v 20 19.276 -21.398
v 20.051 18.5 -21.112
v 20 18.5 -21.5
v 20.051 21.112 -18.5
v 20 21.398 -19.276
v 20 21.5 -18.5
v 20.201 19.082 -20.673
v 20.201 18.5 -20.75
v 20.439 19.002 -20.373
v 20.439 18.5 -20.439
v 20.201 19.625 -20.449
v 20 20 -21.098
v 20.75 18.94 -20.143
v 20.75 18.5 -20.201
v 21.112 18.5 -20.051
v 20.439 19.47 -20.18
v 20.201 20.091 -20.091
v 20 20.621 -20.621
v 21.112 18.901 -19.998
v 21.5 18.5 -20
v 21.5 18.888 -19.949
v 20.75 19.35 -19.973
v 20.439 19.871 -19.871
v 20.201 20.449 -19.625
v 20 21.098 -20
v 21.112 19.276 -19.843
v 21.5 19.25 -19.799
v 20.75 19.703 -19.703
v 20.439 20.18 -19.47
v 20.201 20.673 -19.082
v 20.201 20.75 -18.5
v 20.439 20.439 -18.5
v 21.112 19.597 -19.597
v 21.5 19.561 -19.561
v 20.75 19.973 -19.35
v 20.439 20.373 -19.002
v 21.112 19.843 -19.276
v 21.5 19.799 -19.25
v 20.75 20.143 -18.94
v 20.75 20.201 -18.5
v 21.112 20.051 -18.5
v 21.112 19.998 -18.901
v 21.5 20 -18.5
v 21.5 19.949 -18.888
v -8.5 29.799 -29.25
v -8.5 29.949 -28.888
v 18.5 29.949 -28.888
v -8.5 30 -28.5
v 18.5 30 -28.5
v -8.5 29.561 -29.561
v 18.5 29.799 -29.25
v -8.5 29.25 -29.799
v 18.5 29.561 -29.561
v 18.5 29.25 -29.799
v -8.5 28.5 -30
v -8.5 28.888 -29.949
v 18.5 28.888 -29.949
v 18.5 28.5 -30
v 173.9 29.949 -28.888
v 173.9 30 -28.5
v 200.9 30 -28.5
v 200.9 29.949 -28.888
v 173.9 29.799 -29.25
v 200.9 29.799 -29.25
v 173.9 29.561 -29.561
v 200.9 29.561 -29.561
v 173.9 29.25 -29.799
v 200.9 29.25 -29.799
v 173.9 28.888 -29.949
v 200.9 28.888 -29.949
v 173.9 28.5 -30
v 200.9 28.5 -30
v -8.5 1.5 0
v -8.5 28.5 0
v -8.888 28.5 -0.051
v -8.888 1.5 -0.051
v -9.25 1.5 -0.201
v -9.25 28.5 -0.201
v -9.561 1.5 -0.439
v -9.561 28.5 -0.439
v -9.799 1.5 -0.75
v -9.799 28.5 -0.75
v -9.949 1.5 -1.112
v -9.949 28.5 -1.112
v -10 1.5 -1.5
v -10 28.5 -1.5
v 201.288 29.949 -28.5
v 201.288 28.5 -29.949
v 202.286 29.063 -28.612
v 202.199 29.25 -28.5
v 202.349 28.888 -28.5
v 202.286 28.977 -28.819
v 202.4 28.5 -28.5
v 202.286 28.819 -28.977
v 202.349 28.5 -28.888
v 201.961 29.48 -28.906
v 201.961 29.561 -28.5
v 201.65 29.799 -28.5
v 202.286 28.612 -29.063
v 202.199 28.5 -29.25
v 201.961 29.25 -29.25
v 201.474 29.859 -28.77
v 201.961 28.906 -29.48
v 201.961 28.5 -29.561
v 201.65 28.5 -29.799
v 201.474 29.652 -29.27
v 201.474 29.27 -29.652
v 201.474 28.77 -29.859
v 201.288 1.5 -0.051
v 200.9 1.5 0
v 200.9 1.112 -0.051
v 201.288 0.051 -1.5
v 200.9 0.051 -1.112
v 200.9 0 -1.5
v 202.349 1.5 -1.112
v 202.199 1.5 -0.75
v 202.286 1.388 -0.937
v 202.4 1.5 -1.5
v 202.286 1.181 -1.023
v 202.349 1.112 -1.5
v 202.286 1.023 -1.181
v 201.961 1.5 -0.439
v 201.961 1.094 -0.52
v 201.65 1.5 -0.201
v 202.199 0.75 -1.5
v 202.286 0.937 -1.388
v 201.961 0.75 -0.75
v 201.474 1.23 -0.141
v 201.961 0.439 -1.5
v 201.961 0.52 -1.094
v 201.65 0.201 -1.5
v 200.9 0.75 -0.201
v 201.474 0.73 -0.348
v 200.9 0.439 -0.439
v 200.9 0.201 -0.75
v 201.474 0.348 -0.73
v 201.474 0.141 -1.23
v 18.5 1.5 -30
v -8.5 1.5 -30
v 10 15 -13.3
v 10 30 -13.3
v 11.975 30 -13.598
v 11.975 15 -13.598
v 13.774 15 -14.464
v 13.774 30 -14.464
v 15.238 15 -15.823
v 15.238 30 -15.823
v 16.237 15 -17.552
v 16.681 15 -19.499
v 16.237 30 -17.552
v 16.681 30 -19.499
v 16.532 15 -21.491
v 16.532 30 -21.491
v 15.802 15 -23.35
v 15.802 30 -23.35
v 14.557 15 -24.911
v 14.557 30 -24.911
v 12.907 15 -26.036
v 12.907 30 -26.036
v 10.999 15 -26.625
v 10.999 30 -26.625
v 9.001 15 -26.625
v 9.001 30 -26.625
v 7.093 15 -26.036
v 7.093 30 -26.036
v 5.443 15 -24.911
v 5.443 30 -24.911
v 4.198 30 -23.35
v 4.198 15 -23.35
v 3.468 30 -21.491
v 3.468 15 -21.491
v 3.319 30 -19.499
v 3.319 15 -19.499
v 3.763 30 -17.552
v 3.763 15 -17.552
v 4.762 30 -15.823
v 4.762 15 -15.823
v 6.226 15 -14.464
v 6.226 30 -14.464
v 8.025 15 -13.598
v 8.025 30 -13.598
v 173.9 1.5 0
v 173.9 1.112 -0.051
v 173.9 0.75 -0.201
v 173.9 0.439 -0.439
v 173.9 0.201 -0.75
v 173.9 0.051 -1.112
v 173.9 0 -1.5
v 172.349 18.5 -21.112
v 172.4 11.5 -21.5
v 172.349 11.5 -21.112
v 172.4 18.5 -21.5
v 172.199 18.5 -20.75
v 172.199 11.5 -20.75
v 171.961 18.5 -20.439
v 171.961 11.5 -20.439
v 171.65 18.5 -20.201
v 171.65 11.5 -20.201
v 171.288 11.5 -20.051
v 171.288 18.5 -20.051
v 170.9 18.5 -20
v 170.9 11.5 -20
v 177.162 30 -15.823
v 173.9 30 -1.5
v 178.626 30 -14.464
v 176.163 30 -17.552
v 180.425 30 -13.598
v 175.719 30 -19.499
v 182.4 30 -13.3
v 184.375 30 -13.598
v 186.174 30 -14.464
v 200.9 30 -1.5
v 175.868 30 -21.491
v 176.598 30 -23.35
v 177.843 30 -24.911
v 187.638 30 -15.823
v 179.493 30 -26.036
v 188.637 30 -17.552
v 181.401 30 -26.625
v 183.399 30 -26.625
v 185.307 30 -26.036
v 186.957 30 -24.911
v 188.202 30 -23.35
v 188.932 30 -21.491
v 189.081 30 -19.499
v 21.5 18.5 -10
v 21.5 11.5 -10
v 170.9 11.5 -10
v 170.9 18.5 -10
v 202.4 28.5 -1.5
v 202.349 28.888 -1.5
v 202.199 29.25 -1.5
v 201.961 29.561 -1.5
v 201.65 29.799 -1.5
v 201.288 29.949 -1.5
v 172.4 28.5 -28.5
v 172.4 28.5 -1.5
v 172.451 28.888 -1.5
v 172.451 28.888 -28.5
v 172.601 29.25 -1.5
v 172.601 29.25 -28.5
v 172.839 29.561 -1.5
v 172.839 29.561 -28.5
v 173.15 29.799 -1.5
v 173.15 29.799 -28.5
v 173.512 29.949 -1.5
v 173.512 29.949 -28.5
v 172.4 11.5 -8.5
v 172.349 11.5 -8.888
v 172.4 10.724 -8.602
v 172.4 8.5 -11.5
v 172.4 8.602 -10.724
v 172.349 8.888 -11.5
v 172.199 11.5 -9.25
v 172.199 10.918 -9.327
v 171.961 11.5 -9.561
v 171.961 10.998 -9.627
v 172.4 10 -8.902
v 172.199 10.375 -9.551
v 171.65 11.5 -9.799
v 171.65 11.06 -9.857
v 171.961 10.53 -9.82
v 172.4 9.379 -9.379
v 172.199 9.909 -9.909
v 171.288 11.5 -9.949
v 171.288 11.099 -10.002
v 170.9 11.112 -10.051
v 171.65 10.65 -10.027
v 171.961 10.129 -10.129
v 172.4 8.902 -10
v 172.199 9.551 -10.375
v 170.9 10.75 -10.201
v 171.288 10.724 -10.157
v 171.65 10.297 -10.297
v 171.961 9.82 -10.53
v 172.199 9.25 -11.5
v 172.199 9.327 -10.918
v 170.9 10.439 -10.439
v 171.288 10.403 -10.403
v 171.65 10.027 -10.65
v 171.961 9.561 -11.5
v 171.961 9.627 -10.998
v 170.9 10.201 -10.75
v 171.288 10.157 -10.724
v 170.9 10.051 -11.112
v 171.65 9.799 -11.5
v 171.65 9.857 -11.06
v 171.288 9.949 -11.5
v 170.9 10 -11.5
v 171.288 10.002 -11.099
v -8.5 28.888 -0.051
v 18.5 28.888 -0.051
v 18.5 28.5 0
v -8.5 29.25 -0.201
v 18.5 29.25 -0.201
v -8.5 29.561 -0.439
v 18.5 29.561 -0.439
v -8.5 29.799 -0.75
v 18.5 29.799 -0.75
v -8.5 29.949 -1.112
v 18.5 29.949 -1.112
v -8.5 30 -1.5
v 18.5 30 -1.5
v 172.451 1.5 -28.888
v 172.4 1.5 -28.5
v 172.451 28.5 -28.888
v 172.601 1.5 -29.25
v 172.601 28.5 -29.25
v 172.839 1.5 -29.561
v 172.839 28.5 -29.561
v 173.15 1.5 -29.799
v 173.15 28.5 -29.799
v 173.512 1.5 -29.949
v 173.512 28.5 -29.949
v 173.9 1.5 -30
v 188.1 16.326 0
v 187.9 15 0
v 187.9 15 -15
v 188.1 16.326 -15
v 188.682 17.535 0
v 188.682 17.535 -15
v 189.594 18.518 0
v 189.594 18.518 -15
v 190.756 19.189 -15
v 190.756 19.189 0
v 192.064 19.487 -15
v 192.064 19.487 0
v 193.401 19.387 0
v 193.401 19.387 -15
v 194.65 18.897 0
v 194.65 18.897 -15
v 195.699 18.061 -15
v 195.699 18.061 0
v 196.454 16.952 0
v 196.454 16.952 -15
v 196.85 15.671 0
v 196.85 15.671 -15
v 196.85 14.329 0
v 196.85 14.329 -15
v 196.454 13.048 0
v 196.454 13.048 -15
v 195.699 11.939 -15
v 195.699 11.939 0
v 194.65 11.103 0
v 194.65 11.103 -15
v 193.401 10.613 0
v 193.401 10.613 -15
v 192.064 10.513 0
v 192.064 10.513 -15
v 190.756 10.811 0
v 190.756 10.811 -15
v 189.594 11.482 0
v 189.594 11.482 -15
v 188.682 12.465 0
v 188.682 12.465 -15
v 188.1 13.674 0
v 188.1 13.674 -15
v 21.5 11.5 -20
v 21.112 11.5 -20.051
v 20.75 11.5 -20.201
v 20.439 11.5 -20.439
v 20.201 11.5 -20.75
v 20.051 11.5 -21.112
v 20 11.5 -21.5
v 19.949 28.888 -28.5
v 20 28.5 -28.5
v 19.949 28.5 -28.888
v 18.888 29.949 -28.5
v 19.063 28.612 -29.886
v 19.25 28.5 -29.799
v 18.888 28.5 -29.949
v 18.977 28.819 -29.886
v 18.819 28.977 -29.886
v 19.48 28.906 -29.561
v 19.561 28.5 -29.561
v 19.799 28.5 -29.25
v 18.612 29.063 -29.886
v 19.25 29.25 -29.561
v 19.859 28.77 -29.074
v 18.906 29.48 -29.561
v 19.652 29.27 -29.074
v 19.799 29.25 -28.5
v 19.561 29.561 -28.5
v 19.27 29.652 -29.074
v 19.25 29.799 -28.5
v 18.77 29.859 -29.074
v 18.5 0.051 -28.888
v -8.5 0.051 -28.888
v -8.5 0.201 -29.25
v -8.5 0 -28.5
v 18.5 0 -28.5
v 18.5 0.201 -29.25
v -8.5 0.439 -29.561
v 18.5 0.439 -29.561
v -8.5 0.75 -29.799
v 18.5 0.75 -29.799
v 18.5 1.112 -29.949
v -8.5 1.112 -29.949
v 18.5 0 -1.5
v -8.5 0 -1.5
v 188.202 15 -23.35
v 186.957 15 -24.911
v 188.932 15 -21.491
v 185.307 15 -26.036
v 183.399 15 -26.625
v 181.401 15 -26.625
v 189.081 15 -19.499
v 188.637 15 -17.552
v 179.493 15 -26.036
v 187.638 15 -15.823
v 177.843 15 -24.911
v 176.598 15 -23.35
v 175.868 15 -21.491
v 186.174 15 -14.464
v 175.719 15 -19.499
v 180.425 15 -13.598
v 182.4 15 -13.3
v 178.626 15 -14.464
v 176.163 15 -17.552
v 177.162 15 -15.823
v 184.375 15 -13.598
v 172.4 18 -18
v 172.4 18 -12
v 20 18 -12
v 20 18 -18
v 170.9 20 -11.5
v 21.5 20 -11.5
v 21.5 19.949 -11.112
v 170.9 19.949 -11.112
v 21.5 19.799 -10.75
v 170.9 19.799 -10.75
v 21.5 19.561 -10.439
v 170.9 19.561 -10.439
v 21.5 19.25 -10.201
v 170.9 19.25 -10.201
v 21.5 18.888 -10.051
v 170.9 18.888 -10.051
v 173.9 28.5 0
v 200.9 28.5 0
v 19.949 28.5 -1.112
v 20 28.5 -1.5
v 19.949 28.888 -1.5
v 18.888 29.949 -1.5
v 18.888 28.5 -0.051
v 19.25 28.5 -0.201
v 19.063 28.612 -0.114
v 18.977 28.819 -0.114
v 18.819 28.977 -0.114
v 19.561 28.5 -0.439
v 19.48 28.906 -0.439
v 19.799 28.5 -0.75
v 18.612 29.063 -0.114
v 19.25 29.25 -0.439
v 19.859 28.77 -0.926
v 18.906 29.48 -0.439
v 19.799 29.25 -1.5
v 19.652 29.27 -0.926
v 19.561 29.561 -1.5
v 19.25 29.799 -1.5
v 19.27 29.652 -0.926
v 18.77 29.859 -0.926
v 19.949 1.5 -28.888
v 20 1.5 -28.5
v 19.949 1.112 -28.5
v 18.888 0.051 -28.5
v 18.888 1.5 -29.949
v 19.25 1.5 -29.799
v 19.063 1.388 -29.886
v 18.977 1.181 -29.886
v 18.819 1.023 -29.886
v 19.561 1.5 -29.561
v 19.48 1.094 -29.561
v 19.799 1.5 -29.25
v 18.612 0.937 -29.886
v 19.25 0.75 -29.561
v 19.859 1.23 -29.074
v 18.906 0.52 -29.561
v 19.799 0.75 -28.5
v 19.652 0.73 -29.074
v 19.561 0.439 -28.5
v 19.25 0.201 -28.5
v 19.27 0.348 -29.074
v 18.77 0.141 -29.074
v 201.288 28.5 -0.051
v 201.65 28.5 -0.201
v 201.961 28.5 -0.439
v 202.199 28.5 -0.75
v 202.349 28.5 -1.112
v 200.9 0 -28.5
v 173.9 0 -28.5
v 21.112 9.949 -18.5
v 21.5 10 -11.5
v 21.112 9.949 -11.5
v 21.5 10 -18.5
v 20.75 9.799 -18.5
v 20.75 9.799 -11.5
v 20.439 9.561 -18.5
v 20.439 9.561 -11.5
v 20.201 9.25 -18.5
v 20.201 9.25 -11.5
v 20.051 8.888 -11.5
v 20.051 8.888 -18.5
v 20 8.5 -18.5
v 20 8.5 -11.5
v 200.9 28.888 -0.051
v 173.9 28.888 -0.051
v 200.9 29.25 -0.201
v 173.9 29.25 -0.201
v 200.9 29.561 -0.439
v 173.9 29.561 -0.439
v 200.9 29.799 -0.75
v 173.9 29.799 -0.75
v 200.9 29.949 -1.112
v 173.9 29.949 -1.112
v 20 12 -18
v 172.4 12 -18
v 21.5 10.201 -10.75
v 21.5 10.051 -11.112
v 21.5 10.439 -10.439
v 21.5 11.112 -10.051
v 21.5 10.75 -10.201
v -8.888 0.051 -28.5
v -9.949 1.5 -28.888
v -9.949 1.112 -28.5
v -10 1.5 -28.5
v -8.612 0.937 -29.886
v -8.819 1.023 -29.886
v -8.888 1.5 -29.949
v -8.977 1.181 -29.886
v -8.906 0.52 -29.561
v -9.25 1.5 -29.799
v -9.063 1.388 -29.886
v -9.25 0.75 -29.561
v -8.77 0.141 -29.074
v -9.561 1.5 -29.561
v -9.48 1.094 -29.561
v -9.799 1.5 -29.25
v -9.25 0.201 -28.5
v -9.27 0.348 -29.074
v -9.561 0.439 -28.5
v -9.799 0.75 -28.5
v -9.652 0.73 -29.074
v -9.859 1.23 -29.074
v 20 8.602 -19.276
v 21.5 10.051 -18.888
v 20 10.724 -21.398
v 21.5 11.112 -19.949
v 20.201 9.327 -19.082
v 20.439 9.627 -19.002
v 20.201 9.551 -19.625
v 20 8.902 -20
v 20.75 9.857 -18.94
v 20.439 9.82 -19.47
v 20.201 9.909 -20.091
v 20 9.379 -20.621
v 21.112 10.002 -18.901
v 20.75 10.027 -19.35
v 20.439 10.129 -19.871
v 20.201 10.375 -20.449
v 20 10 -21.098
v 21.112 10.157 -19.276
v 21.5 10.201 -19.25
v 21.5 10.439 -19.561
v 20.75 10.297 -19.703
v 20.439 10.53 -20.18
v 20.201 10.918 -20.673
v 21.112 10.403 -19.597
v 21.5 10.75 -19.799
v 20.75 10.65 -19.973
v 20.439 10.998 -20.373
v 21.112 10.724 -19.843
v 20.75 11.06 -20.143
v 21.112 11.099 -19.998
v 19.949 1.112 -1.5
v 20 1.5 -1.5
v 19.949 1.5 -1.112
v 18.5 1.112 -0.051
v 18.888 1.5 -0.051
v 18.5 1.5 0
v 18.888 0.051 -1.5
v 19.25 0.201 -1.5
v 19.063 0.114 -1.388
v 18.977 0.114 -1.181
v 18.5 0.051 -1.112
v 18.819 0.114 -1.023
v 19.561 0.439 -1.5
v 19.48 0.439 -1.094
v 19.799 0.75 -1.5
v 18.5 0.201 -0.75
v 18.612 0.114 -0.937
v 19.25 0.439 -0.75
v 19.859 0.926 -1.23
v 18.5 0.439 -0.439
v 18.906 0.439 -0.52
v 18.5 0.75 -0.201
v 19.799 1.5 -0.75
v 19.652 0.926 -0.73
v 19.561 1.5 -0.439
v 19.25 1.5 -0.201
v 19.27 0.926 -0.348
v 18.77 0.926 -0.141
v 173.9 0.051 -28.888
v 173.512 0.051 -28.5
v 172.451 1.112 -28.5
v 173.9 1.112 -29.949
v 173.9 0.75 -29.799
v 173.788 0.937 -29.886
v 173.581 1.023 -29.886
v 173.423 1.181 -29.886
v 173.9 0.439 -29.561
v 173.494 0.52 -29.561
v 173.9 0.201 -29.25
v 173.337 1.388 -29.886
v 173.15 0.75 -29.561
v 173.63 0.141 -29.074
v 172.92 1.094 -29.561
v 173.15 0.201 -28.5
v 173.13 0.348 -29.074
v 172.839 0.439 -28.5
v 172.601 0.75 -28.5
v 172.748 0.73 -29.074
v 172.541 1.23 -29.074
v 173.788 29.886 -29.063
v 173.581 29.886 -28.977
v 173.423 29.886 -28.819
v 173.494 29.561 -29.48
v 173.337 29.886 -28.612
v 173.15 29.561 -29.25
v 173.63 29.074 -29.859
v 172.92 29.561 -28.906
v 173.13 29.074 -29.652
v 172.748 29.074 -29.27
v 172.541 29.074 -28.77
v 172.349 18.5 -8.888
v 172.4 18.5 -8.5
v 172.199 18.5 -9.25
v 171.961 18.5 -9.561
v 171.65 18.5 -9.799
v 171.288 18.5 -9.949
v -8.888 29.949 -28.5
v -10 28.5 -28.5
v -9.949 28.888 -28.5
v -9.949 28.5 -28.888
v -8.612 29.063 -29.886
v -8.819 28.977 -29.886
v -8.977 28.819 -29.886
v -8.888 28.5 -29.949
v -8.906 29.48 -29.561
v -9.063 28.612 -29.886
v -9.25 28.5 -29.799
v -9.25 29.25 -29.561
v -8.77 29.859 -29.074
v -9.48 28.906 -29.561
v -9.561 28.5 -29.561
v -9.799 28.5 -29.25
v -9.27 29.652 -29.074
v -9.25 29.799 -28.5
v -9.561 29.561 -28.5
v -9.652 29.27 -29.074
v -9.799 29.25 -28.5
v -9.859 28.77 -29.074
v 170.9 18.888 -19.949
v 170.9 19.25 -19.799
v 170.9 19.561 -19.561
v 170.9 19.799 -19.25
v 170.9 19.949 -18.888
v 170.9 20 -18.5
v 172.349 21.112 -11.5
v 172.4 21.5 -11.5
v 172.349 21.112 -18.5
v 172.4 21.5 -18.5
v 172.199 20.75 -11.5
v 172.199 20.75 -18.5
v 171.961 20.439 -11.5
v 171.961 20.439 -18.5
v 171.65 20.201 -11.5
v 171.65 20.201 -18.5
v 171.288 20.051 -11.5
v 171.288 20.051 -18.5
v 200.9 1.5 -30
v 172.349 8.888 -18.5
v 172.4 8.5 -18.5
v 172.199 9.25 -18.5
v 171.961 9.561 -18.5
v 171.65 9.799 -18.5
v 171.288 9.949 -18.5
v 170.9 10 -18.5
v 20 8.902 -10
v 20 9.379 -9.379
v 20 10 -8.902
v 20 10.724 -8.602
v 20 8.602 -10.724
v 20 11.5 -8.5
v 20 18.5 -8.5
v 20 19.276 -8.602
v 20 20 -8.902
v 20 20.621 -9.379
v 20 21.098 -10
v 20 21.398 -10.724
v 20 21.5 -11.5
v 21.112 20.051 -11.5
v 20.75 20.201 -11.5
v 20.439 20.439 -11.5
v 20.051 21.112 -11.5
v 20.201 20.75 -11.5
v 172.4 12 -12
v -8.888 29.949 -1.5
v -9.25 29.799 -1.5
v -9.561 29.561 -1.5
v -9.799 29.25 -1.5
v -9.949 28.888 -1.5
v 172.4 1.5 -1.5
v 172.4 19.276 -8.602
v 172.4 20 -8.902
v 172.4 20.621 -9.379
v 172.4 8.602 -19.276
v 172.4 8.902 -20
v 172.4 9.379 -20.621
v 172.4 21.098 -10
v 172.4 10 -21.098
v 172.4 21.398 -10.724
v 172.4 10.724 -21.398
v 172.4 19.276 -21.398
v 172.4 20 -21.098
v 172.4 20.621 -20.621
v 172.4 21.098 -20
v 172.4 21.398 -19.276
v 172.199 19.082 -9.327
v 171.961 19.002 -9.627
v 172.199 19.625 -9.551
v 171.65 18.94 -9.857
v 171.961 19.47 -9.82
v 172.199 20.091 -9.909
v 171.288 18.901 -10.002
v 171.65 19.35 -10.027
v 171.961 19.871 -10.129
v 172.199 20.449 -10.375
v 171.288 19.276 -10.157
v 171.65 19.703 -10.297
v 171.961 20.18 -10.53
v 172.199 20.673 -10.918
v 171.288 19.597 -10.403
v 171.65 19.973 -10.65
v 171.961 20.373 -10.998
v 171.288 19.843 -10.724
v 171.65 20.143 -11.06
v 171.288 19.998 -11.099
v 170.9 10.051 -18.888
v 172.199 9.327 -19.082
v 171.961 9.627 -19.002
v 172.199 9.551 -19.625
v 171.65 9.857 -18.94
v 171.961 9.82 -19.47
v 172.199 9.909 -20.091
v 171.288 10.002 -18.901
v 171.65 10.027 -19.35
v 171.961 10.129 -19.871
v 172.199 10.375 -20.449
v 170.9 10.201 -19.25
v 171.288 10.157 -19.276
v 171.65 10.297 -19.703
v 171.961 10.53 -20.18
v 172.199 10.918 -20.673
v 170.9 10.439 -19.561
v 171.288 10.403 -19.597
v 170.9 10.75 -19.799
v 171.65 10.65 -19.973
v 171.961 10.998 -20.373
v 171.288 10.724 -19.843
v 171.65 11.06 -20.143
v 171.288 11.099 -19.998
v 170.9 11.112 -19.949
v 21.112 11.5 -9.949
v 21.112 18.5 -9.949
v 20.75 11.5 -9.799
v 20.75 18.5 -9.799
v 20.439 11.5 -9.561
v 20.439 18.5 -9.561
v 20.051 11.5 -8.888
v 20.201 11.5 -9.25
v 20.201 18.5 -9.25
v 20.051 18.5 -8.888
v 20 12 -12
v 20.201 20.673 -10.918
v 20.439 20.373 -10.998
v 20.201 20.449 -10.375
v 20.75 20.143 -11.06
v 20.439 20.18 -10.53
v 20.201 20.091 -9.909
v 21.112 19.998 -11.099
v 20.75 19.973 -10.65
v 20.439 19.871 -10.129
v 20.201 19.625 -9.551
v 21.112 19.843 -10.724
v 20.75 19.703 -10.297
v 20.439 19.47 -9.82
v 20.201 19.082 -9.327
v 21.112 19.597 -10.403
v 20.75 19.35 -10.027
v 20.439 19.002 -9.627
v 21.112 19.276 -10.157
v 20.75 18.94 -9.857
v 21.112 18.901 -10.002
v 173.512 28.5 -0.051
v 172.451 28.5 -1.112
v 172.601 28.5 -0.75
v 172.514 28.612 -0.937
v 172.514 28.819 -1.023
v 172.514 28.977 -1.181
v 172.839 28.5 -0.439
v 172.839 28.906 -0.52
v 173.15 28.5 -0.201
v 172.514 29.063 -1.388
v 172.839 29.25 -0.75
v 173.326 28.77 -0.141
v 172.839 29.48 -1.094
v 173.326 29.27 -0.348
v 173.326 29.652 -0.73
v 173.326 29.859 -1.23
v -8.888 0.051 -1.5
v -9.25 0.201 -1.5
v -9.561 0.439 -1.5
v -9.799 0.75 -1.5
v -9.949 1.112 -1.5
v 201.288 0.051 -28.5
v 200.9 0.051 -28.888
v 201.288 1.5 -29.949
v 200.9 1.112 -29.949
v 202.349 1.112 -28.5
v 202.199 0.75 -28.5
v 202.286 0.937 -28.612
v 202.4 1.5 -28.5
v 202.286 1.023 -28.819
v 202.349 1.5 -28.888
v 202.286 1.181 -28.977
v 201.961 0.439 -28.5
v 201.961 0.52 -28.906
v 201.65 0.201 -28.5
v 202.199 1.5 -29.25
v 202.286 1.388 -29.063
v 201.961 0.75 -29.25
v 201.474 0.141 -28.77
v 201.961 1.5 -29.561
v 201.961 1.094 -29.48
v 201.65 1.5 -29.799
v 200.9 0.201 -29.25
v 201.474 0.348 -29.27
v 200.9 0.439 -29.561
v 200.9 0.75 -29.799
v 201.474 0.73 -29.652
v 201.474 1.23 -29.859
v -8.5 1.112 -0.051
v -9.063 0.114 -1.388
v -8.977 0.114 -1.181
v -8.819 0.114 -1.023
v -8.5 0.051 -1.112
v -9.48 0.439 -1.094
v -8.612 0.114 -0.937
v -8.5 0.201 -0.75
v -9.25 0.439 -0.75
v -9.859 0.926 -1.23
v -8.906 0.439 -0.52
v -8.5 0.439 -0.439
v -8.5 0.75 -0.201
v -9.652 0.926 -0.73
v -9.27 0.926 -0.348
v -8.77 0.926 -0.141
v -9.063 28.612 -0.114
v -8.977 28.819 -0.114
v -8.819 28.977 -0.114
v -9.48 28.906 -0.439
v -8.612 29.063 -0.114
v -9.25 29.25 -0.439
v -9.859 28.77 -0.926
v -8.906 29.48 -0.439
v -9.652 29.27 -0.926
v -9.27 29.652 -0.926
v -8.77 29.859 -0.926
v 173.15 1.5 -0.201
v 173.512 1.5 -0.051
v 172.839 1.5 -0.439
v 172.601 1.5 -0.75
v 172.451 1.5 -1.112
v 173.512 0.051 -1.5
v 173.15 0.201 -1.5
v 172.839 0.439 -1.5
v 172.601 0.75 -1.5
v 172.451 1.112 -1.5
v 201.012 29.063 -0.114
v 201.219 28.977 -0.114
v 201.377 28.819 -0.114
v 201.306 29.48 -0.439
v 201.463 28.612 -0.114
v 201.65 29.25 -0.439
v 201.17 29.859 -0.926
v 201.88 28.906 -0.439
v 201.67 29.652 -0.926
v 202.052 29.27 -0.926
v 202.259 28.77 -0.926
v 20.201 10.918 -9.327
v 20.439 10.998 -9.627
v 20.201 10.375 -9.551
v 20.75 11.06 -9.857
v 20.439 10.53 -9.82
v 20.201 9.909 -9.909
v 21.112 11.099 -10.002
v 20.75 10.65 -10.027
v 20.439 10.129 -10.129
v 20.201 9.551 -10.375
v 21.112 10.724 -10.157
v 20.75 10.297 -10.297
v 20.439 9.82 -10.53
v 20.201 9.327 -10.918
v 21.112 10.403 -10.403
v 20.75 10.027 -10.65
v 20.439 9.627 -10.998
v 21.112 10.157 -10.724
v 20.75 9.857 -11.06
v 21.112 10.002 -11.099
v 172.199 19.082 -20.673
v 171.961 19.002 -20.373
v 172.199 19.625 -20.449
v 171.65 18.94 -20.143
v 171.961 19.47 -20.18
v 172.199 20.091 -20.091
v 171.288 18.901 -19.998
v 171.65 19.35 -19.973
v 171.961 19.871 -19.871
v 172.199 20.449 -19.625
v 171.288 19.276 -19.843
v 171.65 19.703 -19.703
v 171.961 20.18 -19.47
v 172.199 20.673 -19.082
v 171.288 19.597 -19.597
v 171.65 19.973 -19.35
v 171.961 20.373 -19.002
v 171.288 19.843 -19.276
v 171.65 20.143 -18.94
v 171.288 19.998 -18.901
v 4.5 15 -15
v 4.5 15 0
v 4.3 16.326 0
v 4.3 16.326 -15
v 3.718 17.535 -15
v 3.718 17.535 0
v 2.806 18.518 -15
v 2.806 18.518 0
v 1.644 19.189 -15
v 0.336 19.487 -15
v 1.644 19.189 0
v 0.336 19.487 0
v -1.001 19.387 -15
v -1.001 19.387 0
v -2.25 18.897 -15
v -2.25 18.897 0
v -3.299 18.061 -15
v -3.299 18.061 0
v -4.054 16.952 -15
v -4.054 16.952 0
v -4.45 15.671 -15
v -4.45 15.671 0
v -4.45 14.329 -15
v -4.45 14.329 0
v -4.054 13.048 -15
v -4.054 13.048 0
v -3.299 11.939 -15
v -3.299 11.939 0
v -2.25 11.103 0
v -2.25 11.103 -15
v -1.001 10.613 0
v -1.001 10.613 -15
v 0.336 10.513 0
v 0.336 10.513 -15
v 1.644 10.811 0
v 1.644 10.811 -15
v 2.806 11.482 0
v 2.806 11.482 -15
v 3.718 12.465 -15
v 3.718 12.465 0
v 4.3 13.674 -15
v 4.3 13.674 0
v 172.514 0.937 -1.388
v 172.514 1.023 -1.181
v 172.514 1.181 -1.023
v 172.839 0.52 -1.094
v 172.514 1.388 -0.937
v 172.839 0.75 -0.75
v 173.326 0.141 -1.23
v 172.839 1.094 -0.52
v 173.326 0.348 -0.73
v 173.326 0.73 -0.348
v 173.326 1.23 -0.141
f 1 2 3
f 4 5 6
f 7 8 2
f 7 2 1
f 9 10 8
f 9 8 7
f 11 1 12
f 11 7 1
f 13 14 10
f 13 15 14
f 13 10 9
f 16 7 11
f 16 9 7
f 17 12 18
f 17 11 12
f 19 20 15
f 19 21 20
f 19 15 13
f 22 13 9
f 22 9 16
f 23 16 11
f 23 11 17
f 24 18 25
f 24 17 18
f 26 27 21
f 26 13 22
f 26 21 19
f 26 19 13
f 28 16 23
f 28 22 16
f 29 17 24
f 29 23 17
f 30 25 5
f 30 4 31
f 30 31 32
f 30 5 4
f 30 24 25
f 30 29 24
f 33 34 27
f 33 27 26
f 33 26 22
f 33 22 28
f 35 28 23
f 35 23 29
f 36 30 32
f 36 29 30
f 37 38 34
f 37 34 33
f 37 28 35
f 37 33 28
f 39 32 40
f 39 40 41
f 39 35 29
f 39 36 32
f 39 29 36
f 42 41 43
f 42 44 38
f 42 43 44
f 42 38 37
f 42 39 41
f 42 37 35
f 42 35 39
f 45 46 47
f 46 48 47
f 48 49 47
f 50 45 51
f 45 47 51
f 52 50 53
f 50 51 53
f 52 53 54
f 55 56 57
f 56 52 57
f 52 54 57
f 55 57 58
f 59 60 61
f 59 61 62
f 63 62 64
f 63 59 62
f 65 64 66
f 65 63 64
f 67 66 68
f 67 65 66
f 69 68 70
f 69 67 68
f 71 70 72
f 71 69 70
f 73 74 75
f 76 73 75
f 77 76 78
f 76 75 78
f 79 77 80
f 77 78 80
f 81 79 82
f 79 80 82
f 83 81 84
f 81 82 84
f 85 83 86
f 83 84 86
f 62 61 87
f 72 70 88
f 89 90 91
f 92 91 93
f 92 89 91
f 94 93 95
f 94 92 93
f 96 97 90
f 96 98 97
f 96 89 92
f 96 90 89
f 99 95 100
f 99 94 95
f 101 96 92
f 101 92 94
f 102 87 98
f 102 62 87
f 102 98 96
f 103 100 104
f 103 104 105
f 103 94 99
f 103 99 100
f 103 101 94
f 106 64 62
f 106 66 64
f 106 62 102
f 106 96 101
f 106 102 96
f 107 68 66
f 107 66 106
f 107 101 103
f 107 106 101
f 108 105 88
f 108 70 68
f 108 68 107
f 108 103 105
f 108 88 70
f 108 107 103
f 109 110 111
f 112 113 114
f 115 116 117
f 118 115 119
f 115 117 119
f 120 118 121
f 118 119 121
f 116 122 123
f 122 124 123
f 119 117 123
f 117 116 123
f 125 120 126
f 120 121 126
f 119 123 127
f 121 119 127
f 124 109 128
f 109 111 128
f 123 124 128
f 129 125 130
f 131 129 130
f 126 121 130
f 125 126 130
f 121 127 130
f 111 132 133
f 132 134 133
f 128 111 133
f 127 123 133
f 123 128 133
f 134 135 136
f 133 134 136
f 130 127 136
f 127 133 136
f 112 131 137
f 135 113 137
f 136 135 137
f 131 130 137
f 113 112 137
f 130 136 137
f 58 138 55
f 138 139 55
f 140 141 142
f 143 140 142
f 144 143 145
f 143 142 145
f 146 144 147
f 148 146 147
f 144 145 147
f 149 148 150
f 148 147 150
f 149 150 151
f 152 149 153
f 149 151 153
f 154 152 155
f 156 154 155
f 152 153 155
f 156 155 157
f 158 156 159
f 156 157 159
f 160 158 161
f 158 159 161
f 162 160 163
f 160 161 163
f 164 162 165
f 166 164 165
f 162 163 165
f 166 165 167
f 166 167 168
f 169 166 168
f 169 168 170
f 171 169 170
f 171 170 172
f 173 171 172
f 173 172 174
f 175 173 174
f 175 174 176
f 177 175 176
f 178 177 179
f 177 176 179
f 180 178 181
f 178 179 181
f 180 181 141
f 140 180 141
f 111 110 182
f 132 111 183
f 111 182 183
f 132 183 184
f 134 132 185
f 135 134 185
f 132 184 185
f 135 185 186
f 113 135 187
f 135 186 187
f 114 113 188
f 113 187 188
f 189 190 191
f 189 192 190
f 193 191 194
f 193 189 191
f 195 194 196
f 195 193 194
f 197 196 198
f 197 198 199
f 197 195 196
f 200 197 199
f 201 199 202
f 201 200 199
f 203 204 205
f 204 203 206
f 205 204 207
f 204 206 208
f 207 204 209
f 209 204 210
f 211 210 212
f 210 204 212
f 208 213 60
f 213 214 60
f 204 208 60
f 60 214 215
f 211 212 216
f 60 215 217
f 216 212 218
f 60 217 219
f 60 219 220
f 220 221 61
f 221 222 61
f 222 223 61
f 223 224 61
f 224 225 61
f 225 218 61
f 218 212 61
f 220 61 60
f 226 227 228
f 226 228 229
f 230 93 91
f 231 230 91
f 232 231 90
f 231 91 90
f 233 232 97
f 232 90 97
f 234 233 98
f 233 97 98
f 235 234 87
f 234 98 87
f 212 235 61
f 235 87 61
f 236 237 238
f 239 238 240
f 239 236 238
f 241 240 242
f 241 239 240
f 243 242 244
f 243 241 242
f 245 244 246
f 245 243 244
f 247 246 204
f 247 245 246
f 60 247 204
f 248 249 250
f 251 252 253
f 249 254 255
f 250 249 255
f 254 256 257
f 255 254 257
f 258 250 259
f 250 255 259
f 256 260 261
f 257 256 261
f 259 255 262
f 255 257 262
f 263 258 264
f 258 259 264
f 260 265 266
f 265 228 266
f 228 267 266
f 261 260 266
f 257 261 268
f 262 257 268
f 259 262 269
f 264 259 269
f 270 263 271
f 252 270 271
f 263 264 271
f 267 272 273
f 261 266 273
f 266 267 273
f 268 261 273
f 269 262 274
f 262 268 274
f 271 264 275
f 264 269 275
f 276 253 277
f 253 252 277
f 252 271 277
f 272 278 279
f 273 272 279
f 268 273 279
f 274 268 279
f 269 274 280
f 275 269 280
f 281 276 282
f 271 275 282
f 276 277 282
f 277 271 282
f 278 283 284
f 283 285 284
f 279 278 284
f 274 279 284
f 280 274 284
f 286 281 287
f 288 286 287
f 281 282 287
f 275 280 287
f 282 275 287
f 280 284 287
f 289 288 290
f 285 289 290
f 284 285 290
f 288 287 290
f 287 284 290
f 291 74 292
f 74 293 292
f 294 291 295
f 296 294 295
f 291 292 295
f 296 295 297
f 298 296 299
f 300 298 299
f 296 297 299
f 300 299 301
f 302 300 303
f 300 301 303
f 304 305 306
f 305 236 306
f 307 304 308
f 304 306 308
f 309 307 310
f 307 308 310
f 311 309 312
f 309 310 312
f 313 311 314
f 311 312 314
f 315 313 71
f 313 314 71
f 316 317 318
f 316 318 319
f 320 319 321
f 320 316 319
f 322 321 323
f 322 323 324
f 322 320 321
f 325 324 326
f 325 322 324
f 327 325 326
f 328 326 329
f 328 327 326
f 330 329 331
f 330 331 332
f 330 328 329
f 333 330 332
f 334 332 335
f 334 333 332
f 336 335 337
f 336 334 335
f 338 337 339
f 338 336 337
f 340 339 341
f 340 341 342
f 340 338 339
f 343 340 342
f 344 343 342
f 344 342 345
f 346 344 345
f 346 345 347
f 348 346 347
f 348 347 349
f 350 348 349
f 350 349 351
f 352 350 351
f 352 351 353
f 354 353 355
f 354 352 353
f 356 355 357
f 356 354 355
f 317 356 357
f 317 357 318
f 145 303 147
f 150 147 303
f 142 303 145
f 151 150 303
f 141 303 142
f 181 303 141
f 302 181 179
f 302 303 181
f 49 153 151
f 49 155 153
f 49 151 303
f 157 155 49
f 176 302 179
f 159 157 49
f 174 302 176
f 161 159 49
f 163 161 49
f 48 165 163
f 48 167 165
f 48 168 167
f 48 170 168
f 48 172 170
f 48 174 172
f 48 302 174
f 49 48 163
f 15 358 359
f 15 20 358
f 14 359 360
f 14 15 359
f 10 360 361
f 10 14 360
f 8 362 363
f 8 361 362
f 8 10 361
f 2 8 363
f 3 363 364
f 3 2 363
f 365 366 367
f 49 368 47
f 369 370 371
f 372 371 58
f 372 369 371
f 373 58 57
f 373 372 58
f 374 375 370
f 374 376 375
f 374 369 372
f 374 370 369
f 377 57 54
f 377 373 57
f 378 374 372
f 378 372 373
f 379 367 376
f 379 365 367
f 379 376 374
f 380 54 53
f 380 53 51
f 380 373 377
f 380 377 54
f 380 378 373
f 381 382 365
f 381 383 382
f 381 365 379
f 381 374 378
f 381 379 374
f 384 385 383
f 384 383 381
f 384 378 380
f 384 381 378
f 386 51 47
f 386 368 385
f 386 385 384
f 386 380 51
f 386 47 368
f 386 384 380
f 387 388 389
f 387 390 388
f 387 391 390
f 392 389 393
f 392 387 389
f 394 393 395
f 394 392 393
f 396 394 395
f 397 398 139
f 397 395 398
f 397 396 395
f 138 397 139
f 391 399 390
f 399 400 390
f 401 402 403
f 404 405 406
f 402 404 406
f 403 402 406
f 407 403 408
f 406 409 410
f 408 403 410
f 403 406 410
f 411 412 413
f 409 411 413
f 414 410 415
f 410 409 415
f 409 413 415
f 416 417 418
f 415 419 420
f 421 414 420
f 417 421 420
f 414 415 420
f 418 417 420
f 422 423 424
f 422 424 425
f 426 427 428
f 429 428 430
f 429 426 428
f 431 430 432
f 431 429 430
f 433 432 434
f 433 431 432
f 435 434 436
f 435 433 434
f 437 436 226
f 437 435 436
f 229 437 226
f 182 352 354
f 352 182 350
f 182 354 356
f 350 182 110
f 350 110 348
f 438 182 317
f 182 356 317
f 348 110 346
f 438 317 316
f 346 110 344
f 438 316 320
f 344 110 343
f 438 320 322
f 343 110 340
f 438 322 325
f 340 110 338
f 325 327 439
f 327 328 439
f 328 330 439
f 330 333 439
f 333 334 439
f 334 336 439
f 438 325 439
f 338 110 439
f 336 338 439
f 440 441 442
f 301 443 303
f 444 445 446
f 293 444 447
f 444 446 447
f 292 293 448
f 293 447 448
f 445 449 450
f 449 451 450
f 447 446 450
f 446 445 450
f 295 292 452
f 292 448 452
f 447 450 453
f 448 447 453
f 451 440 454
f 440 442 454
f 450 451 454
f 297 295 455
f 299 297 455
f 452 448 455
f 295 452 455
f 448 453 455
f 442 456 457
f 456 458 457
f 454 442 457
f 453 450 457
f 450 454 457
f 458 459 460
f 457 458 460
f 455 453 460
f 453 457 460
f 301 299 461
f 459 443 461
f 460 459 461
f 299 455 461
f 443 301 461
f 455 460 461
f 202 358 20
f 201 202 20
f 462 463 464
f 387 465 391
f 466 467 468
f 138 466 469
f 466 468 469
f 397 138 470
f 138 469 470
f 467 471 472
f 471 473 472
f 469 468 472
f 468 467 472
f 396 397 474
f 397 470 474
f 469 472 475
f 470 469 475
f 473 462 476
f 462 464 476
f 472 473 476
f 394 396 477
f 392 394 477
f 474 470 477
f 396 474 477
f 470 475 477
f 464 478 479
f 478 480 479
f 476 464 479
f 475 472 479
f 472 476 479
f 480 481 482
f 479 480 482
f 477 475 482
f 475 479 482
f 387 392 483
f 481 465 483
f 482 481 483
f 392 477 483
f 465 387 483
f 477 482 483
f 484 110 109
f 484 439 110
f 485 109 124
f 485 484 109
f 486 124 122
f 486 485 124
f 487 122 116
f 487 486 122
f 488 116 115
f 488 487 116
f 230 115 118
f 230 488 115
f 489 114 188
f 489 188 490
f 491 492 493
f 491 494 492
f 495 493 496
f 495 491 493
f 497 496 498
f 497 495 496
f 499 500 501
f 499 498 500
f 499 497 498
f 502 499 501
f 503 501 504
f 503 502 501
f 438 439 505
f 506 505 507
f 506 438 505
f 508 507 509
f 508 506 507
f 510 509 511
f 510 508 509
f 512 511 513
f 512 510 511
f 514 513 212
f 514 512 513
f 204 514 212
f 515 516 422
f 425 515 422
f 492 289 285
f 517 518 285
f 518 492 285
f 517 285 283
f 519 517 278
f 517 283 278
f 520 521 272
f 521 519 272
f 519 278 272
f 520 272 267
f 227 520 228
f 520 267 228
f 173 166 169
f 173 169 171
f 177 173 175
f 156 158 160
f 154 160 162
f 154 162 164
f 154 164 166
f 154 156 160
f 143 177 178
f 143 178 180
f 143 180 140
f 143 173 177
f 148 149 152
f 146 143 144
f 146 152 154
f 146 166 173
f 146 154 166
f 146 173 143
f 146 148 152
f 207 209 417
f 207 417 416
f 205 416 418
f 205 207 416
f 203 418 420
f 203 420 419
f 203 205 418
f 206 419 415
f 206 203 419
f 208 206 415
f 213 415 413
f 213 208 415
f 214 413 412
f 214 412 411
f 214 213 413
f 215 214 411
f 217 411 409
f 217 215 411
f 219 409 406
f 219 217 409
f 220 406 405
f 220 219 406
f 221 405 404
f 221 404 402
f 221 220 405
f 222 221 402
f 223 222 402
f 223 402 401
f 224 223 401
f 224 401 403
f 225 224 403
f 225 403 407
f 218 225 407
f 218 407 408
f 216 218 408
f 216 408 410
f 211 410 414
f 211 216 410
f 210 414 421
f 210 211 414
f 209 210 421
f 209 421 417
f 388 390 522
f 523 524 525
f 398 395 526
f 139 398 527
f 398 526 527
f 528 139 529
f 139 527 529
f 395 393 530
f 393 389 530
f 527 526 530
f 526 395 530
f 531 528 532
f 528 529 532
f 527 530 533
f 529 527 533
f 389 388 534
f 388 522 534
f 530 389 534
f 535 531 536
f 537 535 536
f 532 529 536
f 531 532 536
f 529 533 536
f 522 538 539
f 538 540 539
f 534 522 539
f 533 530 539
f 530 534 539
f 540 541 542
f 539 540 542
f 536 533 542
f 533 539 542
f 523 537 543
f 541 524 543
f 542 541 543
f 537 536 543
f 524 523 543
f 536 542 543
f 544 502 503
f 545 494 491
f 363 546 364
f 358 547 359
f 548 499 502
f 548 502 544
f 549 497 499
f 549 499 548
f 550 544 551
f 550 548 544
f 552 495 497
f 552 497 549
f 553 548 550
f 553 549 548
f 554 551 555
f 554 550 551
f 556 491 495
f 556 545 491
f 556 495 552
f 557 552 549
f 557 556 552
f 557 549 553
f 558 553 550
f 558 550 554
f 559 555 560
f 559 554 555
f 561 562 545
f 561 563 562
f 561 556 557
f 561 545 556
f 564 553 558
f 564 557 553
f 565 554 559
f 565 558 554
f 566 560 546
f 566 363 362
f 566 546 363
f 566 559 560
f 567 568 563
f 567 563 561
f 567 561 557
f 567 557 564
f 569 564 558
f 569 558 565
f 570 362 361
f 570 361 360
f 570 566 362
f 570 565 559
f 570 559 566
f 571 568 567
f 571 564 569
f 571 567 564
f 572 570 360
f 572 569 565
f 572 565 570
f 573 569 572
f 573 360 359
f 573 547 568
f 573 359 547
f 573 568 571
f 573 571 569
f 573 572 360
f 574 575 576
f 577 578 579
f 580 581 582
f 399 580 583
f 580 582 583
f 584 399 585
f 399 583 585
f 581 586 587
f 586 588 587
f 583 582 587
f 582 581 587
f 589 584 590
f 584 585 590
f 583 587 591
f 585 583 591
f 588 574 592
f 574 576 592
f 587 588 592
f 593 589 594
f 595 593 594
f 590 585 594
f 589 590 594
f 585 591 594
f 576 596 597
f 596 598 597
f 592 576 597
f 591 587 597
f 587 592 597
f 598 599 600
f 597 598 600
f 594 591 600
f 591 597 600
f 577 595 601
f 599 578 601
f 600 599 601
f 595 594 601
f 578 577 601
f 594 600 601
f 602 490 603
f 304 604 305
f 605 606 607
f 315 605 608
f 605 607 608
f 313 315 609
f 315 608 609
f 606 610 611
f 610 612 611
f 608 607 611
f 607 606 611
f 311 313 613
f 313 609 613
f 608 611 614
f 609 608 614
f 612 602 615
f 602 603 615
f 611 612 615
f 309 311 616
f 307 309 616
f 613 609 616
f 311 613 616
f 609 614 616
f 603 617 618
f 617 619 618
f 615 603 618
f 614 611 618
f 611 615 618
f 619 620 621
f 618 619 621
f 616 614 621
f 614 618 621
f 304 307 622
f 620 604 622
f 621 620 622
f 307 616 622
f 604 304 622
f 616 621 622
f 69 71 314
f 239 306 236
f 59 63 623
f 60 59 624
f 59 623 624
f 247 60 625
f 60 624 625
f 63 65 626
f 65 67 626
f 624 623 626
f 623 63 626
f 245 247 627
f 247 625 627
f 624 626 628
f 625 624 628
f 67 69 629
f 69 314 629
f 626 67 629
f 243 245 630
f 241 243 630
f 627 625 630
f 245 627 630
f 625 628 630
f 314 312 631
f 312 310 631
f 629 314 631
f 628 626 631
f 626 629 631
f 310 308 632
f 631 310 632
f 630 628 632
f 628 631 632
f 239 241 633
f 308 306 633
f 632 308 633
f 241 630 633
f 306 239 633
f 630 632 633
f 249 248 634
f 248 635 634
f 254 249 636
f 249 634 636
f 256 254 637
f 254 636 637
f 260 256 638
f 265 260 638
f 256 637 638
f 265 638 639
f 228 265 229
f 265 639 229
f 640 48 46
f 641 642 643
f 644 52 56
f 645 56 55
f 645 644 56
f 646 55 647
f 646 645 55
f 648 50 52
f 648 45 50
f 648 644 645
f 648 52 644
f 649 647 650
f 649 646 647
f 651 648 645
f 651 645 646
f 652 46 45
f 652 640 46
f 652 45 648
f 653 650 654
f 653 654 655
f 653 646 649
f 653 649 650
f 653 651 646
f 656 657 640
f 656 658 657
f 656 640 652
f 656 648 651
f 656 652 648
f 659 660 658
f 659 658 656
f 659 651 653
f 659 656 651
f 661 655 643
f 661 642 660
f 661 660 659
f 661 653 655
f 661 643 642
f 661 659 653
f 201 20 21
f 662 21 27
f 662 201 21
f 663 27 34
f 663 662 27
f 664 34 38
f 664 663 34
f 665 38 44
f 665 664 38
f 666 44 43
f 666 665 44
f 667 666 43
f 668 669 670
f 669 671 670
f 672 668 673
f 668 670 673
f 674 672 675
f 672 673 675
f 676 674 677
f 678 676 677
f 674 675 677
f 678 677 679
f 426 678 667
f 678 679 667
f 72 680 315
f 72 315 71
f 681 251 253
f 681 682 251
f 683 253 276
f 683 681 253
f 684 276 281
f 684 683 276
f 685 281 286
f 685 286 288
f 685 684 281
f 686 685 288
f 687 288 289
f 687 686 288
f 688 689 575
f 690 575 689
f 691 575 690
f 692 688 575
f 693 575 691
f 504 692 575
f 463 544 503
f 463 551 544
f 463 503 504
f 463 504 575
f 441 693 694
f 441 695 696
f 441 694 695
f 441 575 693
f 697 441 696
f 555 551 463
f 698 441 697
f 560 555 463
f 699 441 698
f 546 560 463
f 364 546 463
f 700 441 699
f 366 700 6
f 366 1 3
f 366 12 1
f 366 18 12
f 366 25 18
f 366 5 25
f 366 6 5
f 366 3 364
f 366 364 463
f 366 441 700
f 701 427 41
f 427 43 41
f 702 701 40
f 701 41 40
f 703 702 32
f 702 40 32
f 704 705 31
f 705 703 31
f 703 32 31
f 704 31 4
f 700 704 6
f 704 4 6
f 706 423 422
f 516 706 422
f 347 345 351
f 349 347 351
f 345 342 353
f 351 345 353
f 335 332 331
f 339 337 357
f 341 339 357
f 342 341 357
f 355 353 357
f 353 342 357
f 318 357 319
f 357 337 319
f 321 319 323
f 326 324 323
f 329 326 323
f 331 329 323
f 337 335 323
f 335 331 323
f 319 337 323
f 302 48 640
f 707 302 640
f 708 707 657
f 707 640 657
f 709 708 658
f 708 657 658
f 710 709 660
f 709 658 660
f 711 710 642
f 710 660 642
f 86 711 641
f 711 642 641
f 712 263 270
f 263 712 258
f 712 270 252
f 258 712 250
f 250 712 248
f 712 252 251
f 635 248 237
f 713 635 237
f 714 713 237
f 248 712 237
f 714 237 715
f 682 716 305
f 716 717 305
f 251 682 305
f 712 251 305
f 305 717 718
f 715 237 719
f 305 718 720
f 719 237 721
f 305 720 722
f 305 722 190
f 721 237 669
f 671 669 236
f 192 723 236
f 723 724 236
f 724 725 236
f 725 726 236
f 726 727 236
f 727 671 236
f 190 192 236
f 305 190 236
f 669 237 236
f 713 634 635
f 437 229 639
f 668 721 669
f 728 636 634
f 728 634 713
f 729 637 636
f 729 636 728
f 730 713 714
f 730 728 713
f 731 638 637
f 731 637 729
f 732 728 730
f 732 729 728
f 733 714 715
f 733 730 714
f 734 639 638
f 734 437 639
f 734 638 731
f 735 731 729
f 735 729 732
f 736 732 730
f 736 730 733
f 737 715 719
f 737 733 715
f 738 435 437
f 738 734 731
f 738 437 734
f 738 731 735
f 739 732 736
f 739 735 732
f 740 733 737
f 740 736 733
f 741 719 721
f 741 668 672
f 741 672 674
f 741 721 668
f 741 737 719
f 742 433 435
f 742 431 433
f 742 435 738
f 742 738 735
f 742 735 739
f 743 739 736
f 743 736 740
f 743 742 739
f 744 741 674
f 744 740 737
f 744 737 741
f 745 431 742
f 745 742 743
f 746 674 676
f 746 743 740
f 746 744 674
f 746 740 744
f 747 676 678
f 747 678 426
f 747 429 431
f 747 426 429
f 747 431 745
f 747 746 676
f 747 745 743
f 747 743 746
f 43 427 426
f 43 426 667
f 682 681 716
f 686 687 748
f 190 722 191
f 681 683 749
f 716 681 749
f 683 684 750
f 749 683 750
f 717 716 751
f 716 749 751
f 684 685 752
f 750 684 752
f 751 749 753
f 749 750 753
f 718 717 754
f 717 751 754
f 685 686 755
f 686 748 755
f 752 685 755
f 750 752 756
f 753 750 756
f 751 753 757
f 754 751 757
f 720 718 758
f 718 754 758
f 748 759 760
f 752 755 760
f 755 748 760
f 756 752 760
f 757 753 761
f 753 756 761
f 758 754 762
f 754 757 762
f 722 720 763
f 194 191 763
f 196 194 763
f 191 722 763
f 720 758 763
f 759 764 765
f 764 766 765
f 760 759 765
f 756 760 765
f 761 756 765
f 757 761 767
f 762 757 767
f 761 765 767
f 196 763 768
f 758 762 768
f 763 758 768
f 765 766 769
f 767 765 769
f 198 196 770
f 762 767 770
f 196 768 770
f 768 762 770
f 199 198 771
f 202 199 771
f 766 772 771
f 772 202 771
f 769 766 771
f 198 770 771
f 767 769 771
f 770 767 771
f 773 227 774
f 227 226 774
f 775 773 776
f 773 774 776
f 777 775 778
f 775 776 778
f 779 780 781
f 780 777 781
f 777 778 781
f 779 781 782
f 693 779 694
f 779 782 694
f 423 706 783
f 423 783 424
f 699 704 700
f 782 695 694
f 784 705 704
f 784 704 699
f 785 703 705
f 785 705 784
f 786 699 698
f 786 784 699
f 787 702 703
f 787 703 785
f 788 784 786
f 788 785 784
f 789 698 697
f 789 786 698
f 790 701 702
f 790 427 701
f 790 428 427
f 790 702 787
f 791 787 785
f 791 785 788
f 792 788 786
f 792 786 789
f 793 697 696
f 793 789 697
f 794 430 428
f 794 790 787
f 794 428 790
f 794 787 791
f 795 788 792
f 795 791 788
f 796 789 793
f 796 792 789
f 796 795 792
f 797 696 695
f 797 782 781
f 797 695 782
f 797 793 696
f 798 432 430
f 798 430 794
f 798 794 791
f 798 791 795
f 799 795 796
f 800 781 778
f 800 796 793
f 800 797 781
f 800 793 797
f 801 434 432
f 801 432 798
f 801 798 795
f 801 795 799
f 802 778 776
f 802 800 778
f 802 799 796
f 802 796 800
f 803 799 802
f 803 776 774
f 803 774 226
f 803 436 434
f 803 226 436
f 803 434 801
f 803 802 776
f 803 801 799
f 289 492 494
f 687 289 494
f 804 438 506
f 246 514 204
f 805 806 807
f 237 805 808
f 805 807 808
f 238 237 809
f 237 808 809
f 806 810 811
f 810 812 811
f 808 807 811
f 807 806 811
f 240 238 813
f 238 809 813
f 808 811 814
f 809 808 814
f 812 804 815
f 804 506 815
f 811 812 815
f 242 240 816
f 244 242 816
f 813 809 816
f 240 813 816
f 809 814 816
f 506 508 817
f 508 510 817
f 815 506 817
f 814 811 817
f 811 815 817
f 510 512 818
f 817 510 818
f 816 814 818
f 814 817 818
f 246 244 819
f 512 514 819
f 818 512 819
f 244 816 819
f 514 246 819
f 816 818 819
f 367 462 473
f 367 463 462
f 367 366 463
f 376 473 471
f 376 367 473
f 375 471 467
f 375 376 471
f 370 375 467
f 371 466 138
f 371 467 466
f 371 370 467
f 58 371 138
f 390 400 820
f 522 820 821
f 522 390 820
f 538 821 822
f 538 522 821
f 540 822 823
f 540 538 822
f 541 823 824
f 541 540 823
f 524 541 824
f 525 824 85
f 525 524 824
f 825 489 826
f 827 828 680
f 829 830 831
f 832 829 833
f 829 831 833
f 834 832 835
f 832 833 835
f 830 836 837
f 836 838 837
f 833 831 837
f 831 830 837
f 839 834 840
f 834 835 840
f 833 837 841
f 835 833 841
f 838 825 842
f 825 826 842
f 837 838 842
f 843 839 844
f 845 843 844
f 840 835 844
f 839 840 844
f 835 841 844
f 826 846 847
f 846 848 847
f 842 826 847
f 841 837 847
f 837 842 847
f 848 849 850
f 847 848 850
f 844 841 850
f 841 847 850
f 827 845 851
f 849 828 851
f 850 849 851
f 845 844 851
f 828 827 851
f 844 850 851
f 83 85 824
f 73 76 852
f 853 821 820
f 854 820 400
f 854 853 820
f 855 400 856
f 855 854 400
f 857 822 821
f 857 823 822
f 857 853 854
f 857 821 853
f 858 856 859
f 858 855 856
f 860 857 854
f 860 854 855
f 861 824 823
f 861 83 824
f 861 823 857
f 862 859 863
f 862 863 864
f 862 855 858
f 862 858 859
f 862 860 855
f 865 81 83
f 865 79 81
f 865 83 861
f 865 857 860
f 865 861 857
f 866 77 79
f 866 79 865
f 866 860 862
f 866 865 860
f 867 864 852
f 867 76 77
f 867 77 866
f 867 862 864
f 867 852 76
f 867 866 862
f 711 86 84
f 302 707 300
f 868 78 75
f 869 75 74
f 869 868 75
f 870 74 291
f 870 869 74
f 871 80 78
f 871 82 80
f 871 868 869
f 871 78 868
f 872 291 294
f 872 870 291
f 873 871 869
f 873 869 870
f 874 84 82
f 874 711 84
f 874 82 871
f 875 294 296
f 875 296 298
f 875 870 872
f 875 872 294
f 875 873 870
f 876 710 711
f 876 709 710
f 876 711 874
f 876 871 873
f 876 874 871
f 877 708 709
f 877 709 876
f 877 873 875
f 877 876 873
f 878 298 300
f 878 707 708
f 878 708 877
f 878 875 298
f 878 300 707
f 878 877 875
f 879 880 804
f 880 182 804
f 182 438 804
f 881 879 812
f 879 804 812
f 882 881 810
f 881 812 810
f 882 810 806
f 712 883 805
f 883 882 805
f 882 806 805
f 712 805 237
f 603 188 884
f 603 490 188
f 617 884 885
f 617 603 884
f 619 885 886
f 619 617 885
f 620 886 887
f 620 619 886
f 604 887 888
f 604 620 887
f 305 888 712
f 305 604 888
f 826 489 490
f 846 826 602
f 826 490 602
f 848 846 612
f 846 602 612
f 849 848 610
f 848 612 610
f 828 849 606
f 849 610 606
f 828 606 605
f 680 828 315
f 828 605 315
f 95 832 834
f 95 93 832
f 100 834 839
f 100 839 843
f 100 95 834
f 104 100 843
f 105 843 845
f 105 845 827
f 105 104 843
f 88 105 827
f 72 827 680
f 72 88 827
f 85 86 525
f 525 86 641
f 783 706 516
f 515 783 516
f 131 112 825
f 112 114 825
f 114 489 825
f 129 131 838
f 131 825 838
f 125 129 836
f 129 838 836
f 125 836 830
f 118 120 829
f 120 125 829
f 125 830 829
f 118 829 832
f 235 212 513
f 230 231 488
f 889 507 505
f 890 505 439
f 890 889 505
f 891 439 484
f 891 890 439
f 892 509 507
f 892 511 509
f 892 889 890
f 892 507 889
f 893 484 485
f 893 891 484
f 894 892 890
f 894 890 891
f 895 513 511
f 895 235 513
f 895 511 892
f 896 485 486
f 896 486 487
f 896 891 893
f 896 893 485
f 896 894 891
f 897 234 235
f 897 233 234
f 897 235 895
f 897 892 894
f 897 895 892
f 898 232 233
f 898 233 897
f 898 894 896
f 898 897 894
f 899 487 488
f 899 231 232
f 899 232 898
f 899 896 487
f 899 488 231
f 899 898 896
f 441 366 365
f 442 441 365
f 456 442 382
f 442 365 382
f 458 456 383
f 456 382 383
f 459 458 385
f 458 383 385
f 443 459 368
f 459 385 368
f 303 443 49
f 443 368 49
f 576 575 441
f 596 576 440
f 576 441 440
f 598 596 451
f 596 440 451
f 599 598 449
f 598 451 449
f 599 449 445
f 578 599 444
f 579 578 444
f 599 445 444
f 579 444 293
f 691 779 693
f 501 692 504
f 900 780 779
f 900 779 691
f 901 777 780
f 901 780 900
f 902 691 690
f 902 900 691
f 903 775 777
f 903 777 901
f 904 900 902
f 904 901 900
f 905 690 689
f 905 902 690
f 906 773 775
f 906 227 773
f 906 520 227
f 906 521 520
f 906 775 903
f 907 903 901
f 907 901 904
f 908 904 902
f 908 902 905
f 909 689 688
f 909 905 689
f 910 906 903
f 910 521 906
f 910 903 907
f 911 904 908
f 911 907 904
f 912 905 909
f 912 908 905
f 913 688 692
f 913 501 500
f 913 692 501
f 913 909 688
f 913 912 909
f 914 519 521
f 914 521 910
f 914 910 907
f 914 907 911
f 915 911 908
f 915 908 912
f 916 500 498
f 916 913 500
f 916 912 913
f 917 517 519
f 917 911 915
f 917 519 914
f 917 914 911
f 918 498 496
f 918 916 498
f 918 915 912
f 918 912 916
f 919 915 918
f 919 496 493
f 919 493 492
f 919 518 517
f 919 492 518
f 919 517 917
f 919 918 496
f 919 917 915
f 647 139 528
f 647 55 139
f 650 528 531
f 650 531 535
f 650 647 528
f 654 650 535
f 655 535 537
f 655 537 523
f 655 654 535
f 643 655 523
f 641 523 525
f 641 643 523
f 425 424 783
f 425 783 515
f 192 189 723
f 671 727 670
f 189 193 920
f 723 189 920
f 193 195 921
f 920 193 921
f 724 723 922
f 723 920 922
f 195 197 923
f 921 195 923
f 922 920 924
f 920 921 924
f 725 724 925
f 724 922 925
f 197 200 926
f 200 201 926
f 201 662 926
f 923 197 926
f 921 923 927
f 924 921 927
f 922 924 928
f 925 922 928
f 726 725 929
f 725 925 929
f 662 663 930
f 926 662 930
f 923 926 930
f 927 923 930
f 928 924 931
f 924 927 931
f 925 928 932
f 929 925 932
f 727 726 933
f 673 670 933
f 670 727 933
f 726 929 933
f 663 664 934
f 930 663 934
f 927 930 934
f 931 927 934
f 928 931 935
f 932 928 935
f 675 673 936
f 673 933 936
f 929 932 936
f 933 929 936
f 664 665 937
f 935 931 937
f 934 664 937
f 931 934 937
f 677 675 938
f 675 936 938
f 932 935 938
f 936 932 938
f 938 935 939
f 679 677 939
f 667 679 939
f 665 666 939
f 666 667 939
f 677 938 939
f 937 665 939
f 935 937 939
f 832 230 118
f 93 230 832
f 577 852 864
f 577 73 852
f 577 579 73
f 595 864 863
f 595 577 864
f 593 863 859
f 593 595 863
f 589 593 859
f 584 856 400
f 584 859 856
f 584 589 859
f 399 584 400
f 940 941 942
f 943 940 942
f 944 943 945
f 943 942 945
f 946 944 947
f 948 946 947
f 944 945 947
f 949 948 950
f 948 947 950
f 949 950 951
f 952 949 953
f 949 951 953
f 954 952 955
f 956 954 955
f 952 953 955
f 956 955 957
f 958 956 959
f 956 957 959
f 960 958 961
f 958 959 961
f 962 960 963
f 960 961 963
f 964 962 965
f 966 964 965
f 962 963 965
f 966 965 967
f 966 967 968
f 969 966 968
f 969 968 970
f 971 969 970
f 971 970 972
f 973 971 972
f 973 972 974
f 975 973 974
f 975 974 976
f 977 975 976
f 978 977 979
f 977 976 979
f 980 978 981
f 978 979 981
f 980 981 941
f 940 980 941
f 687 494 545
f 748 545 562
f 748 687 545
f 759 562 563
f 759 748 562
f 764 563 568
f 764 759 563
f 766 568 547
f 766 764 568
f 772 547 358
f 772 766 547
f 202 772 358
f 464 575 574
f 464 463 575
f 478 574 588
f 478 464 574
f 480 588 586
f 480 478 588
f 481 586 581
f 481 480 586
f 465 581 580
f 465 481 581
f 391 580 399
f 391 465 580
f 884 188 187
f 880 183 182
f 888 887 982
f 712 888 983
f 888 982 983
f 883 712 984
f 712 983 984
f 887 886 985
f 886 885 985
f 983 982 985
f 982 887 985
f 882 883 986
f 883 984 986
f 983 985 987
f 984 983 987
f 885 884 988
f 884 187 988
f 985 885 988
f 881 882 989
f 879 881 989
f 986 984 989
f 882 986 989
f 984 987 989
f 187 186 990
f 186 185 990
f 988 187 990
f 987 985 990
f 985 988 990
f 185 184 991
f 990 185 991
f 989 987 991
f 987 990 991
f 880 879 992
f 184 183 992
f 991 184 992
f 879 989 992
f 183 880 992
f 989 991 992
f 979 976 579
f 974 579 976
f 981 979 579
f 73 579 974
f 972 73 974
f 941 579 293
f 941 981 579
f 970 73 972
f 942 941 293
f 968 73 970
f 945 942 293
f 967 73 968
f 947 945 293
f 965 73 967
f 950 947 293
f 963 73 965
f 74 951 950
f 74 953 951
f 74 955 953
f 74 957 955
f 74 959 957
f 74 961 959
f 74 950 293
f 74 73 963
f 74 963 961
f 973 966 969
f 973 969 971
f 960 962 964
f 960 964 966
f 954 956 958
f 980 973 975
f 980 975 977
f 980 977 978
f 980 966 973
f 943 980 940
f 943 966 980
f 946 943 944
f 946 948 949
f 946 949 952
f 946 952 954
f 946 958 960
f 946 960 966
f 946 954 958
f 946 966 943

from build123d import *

# Parameters (mm, degrees)
BOSS_EXTRUDE1_START = -10
SKETCH1_W           = 30
SKETCH1_H           = 30
BOSS_EXTRUDE1_DEPTH = 30
SKETCH2_W           = 10
SKETCH2_H           = 10
BOSS_EXTRUDE2_DEPTH = 152.4
SKETCH3_W           = 6
SKETCH3_H           = 6
CUT_EXTRUDE1_DEPTH  = 152.4
SKETCH4_R           = 6.7
CUT_EXTRUDE2_DEPTH  = 15
SKETCH5_R           = 4.5
CUT_EXTRUDE3_DEPTH  = 15
FILLET3_R           = 1.5


with BuildPart() as part:
    # Sketch1 → Boss-Extrude1 (new body)
    with BuildSketch(Plane(origin=(0, 0, 0), x_dir=(0, 0, -1), z_dir=(1, 0, 0)).offset(BOSS_EXTRUDE1_START)):
        with Locations((15, 15)):
            Rectangle(SKETCH1_W, SKETCH1_H)
    boss_extrude1 = extrude(amount=BOSS_EXTRUDE1_DEPTH)

    # Sketch2 → Boss-Extrude2 (add)
    with BuildSketch(Plane(origin=(20, 0, 0), x_dir=(0, 0, -1), z_dir=(1, 0, 0))):
        with Locations((15, 15)):
            Rectangle(SKETCH2_W, SKETCH2_H)
    extrude(amount=BOSS_EXTRUDE2_DEPTH)

    # Sketch3 → Cut-Extrude1 (cut)
    with BuildSketch(Plane(origin=(172.4, 0, 0), x_dir=(0, 0, -1), z_dir=(1, 0, 0))):
        with Locations((15, 15)):
            Rectangle(SKETCH3_W, SKETCH3_H)
    extrude(amount=-CUT_EXTRUDE1_DEPTH, mode=Mode.SUBTRACT)

    # Sketch4 → Cut-Extrude2 (cut)
    with BuildSketch(Plane(origin=(0, 30, 0), x_dir=(1, 0, 0), z_dir=(0, 1, 0))):
        with Locations(Location((10, 20, 0), (0, 0, 270))):
            Circle(SKETCH4_R)
    cut_extrude2 = extrude(amount=-CUT_EXTRUDE2_DEPTH, mode=Mode.SUBTRACT)

    # Sketch5 → Cut-Extrude3 (cut)
    with BuildSketch(Plane.XY):
        with Locations((0, 15)):
            Circle(SKETCH5_R)
    cut_extrude3 = extrude(amount=-CUT_EXTRUDE3_DEPTH, mode=Mode.SUBTRACT)

    # Mirror1: Boss-Extrude1, Cut-Extrude2, Cut-Extrude3 across plane
    add(boss_extrude1.mirror(Plane(origin=(96.2, 0, 0), x_dir=(0, 0, 1), z_dir=(1, 0, 0))))
    add(cut_extrude2.mirror(Plane(origin=(96.2, 0, 0), x_dir=(0, 0, 1), z_dir=(1, 0, 0))), mode=Mode.SUBTRACT)
    add(cut_extrude3.mirror(Plane(origin=(96.2, 0, 0), x_dir=(0, 0, 1), z_dir=(1, 0, 0))), mode=Mode.SUBTRACT)

    # Fillet3
    fillet3_edges = [part.edges().sort_by_distance(p)[0] for p in [
        (20, 30, -15),
        (20, 15, 0),
        (20, 0, -15),
        (-10, 30, -15),
        (20, 15, -30),
        (-10, 15, 0),
        (20, 15, -10),
        (96.2, 20, -10),
        (20, 10, -15),
        (96.2, 10, -10),
        (20, 15, -20),
        (96.2, 10, -20),
        (20, 20, -15),
        (96.2, 20, -20),
        (172.4, 15, -10),
        (172.4, 10, -15),
        (172.4, 15, -20),
        (172.4, 20, -15),
        (-10, 0, -15),
        (187.4, 0, 0),
        (172.4, 0, -15),
        (187.4, 0, -30),
        (172.4, 15, -30),
        (187.4, 30, -30),
        (202.4, 30, -15),
        (187.4, 30, 0),
        (202.4, 15, 0),
        (202.4, 0, -15),
        (202.4, 15, -30),
        (172.4, 15, 0),
        (172.4, 30, -15),
        (5, 0, 0),
        (5, 30, 0),
        (5, 30, -30),
        (5, 0, -30),
        (-10, 15, -30),
    ]]
    fillet(fillet3_edges, radius=FILLET3_R)


solid = part.part
